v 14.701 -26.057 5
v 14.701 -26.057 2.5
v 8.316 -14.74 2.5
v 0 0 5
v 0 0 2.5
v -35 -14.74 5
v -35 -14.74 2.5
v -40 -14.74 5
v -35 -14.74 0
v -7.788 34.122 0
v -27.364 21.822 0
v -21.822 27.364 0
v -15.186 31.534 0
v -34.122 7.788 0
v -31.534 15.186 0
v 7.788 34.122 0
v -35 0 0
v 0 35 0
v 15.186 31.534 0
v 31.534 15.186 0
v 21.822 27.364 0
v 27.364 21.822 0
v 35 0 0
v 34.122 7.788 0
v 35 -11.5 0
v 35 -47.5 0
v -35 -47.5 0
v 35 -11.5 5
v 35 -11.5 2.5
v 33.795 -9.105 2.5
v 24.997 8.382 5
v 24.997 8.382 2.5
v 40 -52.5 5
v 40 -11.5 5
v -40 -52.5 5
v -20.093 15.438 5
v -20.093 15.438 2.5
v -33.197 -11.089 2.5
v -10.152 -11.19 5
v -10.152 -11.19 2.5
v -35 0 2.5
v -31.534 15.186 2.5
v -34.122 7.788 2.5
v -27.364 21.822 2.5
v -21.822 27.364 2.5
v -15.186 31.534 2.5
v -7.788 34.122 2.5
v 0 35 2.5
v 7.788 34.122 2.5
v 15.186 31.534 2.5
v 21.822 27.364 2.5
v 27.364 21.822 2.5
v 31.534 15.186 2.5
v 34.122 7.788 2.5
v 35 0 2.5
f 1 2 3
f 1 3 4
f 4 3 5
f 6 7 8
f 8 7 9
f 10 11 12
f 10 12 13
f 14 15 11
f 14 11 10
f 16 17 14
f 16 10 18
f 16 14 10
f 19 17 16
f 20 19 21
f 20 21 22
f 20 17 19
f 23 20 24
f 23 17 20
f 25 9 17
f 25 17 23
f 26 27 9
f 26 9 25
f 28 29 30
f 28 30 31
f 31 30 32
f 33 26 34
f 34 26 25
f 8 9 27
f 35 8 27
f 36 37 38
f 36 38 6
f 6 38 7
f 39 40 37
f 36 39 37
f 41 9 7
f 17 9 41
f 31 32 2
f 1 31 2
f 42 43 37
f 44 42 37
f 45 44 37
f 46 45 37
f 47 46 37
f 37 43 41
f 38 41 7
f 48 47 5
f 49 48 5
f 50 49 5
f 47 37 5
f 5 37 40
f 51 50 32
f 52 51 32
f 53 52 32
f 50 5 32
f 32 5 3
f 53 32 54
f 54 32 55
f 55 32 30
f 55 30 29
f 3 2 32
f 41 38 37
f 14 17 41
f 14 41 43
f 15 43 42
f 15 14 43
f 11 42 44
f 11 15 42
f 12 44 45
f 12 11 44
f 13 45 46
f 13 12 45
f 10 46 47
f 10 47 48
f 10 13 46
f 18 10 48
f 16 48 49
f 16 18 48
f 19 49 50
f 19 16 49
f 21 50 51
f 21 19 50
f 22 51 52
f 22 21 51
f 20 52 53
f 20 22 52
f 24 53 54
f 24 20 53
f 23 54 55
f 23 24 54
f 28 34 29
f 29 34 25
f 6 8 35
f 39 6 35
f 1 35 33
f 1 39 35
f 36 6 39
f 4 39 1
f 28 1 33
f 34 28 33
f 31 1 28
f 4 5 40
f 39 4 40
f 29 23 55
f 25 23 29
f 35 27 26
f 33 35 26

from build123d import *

# Parameters (mm, degrees)
F1_DEPTH = 5
F2_SIZE  = 4.99999
F4_DEPTH = 2.5


# Not quite as in the source:
# - a fillet or chamfer is up to 0.001 mm smaller than in the source, because OpenCascade refuses the exact size


with BuildPart() as f1:
    # F0 (on Top) → F1 (new body)
    with BuildSketch(Plane.XY):
        Polygon((-35, -47.5), (35, -47.5), (35, -11.5), (24.9973740429, 8.3822524399), (14.7012080997, -26.056649141), (0, 0), (-10.1515629949, -11.1895798258), (-20.0927332044, 15.4384202456), (-35, -14.74), align=None)
        Polygon((35, -11.5), (35, -47.5), (-35, -47.5), (-35, -14.74), (-40, -14.74), (-40, -52.5), (40, -52.5), (40, -11.5), align=None)
    extrude(amount=F1_DEPTH)

    # F2 (size 5 in the source; OpenCascade refuses exactly that, so slightly less here)
    f2_edges = [f1.edges().sort_by_distance(p)[0] for p in [
        (40, -32, 0),
        (0, -52.5, 0),
        (-40, -33.62, 0),
    ]]
    chamfer(f2_edges, length=F2_SIZE)

    # F3 (on face) → F4 (join)
    with BuildSketch(Plane(origin=(0, 0, 0), x_dir=(1, 0, 0), z_dir=(0, 0, -1))):
        with BuildLine():
            ThreePointArc((-33.1967424913, 11.0894674339), (-34.5462442763, 5.6175623185), (-35, 0))
            ThreePointArc((-35, 0), (0, -35), (35, 0))
            ThreePointArc((35, 0), (34.6974429309, 4.5921078013), (33.7950026252, 9.1048227638))
            Line((33.7950026252, 9.1048227638), (24.9973740429, -8.3822524399))
            Line((24.9973740429, -8.3822524399), (18.0845360262, 14.74))
            Line((18.0845360262, 14.74), (8.3163343919, 14.74))
            Line((8.3163343919, 14.74), (0, 0))
            Line((0, 0), (-10.1515629949, 11.1895798258))
            Line((-10.1515629949, 11.1895798258), (-20.0927332044, -15.4384202456))
            Line((-20.0927332044, -15.4384202456), (-33.1967424913, 11.0894674339))
        make_face()
        Polygon((14.7012080997, 26.056649141), (8.3163343919, 14.74), (18.0845360262, 14.74), align=None)
        with BuildLine():
            Line((-35, 14.74), (-35, 0))
            ThreePointArc((-35, 0), (-34.5462442763, 5.6175623185), (-33.1967424913, 11.0894674339))
            Line((-33.1967424913, 11.0894674339), (-35, 14.74))
        make_face()
        with BuildLine():
            ThreePointArc((33.7950026252, 9.1048227638), (34.6974429309, 4.5921078013), (35, 0))
            Line((35, 0), (35, 11.5))
            Line((35, 11.5), (33.7950026252, 9.1048227638))
        make_face()
    extrude(amount=-F4_DEPTH)


solid = f1.part
